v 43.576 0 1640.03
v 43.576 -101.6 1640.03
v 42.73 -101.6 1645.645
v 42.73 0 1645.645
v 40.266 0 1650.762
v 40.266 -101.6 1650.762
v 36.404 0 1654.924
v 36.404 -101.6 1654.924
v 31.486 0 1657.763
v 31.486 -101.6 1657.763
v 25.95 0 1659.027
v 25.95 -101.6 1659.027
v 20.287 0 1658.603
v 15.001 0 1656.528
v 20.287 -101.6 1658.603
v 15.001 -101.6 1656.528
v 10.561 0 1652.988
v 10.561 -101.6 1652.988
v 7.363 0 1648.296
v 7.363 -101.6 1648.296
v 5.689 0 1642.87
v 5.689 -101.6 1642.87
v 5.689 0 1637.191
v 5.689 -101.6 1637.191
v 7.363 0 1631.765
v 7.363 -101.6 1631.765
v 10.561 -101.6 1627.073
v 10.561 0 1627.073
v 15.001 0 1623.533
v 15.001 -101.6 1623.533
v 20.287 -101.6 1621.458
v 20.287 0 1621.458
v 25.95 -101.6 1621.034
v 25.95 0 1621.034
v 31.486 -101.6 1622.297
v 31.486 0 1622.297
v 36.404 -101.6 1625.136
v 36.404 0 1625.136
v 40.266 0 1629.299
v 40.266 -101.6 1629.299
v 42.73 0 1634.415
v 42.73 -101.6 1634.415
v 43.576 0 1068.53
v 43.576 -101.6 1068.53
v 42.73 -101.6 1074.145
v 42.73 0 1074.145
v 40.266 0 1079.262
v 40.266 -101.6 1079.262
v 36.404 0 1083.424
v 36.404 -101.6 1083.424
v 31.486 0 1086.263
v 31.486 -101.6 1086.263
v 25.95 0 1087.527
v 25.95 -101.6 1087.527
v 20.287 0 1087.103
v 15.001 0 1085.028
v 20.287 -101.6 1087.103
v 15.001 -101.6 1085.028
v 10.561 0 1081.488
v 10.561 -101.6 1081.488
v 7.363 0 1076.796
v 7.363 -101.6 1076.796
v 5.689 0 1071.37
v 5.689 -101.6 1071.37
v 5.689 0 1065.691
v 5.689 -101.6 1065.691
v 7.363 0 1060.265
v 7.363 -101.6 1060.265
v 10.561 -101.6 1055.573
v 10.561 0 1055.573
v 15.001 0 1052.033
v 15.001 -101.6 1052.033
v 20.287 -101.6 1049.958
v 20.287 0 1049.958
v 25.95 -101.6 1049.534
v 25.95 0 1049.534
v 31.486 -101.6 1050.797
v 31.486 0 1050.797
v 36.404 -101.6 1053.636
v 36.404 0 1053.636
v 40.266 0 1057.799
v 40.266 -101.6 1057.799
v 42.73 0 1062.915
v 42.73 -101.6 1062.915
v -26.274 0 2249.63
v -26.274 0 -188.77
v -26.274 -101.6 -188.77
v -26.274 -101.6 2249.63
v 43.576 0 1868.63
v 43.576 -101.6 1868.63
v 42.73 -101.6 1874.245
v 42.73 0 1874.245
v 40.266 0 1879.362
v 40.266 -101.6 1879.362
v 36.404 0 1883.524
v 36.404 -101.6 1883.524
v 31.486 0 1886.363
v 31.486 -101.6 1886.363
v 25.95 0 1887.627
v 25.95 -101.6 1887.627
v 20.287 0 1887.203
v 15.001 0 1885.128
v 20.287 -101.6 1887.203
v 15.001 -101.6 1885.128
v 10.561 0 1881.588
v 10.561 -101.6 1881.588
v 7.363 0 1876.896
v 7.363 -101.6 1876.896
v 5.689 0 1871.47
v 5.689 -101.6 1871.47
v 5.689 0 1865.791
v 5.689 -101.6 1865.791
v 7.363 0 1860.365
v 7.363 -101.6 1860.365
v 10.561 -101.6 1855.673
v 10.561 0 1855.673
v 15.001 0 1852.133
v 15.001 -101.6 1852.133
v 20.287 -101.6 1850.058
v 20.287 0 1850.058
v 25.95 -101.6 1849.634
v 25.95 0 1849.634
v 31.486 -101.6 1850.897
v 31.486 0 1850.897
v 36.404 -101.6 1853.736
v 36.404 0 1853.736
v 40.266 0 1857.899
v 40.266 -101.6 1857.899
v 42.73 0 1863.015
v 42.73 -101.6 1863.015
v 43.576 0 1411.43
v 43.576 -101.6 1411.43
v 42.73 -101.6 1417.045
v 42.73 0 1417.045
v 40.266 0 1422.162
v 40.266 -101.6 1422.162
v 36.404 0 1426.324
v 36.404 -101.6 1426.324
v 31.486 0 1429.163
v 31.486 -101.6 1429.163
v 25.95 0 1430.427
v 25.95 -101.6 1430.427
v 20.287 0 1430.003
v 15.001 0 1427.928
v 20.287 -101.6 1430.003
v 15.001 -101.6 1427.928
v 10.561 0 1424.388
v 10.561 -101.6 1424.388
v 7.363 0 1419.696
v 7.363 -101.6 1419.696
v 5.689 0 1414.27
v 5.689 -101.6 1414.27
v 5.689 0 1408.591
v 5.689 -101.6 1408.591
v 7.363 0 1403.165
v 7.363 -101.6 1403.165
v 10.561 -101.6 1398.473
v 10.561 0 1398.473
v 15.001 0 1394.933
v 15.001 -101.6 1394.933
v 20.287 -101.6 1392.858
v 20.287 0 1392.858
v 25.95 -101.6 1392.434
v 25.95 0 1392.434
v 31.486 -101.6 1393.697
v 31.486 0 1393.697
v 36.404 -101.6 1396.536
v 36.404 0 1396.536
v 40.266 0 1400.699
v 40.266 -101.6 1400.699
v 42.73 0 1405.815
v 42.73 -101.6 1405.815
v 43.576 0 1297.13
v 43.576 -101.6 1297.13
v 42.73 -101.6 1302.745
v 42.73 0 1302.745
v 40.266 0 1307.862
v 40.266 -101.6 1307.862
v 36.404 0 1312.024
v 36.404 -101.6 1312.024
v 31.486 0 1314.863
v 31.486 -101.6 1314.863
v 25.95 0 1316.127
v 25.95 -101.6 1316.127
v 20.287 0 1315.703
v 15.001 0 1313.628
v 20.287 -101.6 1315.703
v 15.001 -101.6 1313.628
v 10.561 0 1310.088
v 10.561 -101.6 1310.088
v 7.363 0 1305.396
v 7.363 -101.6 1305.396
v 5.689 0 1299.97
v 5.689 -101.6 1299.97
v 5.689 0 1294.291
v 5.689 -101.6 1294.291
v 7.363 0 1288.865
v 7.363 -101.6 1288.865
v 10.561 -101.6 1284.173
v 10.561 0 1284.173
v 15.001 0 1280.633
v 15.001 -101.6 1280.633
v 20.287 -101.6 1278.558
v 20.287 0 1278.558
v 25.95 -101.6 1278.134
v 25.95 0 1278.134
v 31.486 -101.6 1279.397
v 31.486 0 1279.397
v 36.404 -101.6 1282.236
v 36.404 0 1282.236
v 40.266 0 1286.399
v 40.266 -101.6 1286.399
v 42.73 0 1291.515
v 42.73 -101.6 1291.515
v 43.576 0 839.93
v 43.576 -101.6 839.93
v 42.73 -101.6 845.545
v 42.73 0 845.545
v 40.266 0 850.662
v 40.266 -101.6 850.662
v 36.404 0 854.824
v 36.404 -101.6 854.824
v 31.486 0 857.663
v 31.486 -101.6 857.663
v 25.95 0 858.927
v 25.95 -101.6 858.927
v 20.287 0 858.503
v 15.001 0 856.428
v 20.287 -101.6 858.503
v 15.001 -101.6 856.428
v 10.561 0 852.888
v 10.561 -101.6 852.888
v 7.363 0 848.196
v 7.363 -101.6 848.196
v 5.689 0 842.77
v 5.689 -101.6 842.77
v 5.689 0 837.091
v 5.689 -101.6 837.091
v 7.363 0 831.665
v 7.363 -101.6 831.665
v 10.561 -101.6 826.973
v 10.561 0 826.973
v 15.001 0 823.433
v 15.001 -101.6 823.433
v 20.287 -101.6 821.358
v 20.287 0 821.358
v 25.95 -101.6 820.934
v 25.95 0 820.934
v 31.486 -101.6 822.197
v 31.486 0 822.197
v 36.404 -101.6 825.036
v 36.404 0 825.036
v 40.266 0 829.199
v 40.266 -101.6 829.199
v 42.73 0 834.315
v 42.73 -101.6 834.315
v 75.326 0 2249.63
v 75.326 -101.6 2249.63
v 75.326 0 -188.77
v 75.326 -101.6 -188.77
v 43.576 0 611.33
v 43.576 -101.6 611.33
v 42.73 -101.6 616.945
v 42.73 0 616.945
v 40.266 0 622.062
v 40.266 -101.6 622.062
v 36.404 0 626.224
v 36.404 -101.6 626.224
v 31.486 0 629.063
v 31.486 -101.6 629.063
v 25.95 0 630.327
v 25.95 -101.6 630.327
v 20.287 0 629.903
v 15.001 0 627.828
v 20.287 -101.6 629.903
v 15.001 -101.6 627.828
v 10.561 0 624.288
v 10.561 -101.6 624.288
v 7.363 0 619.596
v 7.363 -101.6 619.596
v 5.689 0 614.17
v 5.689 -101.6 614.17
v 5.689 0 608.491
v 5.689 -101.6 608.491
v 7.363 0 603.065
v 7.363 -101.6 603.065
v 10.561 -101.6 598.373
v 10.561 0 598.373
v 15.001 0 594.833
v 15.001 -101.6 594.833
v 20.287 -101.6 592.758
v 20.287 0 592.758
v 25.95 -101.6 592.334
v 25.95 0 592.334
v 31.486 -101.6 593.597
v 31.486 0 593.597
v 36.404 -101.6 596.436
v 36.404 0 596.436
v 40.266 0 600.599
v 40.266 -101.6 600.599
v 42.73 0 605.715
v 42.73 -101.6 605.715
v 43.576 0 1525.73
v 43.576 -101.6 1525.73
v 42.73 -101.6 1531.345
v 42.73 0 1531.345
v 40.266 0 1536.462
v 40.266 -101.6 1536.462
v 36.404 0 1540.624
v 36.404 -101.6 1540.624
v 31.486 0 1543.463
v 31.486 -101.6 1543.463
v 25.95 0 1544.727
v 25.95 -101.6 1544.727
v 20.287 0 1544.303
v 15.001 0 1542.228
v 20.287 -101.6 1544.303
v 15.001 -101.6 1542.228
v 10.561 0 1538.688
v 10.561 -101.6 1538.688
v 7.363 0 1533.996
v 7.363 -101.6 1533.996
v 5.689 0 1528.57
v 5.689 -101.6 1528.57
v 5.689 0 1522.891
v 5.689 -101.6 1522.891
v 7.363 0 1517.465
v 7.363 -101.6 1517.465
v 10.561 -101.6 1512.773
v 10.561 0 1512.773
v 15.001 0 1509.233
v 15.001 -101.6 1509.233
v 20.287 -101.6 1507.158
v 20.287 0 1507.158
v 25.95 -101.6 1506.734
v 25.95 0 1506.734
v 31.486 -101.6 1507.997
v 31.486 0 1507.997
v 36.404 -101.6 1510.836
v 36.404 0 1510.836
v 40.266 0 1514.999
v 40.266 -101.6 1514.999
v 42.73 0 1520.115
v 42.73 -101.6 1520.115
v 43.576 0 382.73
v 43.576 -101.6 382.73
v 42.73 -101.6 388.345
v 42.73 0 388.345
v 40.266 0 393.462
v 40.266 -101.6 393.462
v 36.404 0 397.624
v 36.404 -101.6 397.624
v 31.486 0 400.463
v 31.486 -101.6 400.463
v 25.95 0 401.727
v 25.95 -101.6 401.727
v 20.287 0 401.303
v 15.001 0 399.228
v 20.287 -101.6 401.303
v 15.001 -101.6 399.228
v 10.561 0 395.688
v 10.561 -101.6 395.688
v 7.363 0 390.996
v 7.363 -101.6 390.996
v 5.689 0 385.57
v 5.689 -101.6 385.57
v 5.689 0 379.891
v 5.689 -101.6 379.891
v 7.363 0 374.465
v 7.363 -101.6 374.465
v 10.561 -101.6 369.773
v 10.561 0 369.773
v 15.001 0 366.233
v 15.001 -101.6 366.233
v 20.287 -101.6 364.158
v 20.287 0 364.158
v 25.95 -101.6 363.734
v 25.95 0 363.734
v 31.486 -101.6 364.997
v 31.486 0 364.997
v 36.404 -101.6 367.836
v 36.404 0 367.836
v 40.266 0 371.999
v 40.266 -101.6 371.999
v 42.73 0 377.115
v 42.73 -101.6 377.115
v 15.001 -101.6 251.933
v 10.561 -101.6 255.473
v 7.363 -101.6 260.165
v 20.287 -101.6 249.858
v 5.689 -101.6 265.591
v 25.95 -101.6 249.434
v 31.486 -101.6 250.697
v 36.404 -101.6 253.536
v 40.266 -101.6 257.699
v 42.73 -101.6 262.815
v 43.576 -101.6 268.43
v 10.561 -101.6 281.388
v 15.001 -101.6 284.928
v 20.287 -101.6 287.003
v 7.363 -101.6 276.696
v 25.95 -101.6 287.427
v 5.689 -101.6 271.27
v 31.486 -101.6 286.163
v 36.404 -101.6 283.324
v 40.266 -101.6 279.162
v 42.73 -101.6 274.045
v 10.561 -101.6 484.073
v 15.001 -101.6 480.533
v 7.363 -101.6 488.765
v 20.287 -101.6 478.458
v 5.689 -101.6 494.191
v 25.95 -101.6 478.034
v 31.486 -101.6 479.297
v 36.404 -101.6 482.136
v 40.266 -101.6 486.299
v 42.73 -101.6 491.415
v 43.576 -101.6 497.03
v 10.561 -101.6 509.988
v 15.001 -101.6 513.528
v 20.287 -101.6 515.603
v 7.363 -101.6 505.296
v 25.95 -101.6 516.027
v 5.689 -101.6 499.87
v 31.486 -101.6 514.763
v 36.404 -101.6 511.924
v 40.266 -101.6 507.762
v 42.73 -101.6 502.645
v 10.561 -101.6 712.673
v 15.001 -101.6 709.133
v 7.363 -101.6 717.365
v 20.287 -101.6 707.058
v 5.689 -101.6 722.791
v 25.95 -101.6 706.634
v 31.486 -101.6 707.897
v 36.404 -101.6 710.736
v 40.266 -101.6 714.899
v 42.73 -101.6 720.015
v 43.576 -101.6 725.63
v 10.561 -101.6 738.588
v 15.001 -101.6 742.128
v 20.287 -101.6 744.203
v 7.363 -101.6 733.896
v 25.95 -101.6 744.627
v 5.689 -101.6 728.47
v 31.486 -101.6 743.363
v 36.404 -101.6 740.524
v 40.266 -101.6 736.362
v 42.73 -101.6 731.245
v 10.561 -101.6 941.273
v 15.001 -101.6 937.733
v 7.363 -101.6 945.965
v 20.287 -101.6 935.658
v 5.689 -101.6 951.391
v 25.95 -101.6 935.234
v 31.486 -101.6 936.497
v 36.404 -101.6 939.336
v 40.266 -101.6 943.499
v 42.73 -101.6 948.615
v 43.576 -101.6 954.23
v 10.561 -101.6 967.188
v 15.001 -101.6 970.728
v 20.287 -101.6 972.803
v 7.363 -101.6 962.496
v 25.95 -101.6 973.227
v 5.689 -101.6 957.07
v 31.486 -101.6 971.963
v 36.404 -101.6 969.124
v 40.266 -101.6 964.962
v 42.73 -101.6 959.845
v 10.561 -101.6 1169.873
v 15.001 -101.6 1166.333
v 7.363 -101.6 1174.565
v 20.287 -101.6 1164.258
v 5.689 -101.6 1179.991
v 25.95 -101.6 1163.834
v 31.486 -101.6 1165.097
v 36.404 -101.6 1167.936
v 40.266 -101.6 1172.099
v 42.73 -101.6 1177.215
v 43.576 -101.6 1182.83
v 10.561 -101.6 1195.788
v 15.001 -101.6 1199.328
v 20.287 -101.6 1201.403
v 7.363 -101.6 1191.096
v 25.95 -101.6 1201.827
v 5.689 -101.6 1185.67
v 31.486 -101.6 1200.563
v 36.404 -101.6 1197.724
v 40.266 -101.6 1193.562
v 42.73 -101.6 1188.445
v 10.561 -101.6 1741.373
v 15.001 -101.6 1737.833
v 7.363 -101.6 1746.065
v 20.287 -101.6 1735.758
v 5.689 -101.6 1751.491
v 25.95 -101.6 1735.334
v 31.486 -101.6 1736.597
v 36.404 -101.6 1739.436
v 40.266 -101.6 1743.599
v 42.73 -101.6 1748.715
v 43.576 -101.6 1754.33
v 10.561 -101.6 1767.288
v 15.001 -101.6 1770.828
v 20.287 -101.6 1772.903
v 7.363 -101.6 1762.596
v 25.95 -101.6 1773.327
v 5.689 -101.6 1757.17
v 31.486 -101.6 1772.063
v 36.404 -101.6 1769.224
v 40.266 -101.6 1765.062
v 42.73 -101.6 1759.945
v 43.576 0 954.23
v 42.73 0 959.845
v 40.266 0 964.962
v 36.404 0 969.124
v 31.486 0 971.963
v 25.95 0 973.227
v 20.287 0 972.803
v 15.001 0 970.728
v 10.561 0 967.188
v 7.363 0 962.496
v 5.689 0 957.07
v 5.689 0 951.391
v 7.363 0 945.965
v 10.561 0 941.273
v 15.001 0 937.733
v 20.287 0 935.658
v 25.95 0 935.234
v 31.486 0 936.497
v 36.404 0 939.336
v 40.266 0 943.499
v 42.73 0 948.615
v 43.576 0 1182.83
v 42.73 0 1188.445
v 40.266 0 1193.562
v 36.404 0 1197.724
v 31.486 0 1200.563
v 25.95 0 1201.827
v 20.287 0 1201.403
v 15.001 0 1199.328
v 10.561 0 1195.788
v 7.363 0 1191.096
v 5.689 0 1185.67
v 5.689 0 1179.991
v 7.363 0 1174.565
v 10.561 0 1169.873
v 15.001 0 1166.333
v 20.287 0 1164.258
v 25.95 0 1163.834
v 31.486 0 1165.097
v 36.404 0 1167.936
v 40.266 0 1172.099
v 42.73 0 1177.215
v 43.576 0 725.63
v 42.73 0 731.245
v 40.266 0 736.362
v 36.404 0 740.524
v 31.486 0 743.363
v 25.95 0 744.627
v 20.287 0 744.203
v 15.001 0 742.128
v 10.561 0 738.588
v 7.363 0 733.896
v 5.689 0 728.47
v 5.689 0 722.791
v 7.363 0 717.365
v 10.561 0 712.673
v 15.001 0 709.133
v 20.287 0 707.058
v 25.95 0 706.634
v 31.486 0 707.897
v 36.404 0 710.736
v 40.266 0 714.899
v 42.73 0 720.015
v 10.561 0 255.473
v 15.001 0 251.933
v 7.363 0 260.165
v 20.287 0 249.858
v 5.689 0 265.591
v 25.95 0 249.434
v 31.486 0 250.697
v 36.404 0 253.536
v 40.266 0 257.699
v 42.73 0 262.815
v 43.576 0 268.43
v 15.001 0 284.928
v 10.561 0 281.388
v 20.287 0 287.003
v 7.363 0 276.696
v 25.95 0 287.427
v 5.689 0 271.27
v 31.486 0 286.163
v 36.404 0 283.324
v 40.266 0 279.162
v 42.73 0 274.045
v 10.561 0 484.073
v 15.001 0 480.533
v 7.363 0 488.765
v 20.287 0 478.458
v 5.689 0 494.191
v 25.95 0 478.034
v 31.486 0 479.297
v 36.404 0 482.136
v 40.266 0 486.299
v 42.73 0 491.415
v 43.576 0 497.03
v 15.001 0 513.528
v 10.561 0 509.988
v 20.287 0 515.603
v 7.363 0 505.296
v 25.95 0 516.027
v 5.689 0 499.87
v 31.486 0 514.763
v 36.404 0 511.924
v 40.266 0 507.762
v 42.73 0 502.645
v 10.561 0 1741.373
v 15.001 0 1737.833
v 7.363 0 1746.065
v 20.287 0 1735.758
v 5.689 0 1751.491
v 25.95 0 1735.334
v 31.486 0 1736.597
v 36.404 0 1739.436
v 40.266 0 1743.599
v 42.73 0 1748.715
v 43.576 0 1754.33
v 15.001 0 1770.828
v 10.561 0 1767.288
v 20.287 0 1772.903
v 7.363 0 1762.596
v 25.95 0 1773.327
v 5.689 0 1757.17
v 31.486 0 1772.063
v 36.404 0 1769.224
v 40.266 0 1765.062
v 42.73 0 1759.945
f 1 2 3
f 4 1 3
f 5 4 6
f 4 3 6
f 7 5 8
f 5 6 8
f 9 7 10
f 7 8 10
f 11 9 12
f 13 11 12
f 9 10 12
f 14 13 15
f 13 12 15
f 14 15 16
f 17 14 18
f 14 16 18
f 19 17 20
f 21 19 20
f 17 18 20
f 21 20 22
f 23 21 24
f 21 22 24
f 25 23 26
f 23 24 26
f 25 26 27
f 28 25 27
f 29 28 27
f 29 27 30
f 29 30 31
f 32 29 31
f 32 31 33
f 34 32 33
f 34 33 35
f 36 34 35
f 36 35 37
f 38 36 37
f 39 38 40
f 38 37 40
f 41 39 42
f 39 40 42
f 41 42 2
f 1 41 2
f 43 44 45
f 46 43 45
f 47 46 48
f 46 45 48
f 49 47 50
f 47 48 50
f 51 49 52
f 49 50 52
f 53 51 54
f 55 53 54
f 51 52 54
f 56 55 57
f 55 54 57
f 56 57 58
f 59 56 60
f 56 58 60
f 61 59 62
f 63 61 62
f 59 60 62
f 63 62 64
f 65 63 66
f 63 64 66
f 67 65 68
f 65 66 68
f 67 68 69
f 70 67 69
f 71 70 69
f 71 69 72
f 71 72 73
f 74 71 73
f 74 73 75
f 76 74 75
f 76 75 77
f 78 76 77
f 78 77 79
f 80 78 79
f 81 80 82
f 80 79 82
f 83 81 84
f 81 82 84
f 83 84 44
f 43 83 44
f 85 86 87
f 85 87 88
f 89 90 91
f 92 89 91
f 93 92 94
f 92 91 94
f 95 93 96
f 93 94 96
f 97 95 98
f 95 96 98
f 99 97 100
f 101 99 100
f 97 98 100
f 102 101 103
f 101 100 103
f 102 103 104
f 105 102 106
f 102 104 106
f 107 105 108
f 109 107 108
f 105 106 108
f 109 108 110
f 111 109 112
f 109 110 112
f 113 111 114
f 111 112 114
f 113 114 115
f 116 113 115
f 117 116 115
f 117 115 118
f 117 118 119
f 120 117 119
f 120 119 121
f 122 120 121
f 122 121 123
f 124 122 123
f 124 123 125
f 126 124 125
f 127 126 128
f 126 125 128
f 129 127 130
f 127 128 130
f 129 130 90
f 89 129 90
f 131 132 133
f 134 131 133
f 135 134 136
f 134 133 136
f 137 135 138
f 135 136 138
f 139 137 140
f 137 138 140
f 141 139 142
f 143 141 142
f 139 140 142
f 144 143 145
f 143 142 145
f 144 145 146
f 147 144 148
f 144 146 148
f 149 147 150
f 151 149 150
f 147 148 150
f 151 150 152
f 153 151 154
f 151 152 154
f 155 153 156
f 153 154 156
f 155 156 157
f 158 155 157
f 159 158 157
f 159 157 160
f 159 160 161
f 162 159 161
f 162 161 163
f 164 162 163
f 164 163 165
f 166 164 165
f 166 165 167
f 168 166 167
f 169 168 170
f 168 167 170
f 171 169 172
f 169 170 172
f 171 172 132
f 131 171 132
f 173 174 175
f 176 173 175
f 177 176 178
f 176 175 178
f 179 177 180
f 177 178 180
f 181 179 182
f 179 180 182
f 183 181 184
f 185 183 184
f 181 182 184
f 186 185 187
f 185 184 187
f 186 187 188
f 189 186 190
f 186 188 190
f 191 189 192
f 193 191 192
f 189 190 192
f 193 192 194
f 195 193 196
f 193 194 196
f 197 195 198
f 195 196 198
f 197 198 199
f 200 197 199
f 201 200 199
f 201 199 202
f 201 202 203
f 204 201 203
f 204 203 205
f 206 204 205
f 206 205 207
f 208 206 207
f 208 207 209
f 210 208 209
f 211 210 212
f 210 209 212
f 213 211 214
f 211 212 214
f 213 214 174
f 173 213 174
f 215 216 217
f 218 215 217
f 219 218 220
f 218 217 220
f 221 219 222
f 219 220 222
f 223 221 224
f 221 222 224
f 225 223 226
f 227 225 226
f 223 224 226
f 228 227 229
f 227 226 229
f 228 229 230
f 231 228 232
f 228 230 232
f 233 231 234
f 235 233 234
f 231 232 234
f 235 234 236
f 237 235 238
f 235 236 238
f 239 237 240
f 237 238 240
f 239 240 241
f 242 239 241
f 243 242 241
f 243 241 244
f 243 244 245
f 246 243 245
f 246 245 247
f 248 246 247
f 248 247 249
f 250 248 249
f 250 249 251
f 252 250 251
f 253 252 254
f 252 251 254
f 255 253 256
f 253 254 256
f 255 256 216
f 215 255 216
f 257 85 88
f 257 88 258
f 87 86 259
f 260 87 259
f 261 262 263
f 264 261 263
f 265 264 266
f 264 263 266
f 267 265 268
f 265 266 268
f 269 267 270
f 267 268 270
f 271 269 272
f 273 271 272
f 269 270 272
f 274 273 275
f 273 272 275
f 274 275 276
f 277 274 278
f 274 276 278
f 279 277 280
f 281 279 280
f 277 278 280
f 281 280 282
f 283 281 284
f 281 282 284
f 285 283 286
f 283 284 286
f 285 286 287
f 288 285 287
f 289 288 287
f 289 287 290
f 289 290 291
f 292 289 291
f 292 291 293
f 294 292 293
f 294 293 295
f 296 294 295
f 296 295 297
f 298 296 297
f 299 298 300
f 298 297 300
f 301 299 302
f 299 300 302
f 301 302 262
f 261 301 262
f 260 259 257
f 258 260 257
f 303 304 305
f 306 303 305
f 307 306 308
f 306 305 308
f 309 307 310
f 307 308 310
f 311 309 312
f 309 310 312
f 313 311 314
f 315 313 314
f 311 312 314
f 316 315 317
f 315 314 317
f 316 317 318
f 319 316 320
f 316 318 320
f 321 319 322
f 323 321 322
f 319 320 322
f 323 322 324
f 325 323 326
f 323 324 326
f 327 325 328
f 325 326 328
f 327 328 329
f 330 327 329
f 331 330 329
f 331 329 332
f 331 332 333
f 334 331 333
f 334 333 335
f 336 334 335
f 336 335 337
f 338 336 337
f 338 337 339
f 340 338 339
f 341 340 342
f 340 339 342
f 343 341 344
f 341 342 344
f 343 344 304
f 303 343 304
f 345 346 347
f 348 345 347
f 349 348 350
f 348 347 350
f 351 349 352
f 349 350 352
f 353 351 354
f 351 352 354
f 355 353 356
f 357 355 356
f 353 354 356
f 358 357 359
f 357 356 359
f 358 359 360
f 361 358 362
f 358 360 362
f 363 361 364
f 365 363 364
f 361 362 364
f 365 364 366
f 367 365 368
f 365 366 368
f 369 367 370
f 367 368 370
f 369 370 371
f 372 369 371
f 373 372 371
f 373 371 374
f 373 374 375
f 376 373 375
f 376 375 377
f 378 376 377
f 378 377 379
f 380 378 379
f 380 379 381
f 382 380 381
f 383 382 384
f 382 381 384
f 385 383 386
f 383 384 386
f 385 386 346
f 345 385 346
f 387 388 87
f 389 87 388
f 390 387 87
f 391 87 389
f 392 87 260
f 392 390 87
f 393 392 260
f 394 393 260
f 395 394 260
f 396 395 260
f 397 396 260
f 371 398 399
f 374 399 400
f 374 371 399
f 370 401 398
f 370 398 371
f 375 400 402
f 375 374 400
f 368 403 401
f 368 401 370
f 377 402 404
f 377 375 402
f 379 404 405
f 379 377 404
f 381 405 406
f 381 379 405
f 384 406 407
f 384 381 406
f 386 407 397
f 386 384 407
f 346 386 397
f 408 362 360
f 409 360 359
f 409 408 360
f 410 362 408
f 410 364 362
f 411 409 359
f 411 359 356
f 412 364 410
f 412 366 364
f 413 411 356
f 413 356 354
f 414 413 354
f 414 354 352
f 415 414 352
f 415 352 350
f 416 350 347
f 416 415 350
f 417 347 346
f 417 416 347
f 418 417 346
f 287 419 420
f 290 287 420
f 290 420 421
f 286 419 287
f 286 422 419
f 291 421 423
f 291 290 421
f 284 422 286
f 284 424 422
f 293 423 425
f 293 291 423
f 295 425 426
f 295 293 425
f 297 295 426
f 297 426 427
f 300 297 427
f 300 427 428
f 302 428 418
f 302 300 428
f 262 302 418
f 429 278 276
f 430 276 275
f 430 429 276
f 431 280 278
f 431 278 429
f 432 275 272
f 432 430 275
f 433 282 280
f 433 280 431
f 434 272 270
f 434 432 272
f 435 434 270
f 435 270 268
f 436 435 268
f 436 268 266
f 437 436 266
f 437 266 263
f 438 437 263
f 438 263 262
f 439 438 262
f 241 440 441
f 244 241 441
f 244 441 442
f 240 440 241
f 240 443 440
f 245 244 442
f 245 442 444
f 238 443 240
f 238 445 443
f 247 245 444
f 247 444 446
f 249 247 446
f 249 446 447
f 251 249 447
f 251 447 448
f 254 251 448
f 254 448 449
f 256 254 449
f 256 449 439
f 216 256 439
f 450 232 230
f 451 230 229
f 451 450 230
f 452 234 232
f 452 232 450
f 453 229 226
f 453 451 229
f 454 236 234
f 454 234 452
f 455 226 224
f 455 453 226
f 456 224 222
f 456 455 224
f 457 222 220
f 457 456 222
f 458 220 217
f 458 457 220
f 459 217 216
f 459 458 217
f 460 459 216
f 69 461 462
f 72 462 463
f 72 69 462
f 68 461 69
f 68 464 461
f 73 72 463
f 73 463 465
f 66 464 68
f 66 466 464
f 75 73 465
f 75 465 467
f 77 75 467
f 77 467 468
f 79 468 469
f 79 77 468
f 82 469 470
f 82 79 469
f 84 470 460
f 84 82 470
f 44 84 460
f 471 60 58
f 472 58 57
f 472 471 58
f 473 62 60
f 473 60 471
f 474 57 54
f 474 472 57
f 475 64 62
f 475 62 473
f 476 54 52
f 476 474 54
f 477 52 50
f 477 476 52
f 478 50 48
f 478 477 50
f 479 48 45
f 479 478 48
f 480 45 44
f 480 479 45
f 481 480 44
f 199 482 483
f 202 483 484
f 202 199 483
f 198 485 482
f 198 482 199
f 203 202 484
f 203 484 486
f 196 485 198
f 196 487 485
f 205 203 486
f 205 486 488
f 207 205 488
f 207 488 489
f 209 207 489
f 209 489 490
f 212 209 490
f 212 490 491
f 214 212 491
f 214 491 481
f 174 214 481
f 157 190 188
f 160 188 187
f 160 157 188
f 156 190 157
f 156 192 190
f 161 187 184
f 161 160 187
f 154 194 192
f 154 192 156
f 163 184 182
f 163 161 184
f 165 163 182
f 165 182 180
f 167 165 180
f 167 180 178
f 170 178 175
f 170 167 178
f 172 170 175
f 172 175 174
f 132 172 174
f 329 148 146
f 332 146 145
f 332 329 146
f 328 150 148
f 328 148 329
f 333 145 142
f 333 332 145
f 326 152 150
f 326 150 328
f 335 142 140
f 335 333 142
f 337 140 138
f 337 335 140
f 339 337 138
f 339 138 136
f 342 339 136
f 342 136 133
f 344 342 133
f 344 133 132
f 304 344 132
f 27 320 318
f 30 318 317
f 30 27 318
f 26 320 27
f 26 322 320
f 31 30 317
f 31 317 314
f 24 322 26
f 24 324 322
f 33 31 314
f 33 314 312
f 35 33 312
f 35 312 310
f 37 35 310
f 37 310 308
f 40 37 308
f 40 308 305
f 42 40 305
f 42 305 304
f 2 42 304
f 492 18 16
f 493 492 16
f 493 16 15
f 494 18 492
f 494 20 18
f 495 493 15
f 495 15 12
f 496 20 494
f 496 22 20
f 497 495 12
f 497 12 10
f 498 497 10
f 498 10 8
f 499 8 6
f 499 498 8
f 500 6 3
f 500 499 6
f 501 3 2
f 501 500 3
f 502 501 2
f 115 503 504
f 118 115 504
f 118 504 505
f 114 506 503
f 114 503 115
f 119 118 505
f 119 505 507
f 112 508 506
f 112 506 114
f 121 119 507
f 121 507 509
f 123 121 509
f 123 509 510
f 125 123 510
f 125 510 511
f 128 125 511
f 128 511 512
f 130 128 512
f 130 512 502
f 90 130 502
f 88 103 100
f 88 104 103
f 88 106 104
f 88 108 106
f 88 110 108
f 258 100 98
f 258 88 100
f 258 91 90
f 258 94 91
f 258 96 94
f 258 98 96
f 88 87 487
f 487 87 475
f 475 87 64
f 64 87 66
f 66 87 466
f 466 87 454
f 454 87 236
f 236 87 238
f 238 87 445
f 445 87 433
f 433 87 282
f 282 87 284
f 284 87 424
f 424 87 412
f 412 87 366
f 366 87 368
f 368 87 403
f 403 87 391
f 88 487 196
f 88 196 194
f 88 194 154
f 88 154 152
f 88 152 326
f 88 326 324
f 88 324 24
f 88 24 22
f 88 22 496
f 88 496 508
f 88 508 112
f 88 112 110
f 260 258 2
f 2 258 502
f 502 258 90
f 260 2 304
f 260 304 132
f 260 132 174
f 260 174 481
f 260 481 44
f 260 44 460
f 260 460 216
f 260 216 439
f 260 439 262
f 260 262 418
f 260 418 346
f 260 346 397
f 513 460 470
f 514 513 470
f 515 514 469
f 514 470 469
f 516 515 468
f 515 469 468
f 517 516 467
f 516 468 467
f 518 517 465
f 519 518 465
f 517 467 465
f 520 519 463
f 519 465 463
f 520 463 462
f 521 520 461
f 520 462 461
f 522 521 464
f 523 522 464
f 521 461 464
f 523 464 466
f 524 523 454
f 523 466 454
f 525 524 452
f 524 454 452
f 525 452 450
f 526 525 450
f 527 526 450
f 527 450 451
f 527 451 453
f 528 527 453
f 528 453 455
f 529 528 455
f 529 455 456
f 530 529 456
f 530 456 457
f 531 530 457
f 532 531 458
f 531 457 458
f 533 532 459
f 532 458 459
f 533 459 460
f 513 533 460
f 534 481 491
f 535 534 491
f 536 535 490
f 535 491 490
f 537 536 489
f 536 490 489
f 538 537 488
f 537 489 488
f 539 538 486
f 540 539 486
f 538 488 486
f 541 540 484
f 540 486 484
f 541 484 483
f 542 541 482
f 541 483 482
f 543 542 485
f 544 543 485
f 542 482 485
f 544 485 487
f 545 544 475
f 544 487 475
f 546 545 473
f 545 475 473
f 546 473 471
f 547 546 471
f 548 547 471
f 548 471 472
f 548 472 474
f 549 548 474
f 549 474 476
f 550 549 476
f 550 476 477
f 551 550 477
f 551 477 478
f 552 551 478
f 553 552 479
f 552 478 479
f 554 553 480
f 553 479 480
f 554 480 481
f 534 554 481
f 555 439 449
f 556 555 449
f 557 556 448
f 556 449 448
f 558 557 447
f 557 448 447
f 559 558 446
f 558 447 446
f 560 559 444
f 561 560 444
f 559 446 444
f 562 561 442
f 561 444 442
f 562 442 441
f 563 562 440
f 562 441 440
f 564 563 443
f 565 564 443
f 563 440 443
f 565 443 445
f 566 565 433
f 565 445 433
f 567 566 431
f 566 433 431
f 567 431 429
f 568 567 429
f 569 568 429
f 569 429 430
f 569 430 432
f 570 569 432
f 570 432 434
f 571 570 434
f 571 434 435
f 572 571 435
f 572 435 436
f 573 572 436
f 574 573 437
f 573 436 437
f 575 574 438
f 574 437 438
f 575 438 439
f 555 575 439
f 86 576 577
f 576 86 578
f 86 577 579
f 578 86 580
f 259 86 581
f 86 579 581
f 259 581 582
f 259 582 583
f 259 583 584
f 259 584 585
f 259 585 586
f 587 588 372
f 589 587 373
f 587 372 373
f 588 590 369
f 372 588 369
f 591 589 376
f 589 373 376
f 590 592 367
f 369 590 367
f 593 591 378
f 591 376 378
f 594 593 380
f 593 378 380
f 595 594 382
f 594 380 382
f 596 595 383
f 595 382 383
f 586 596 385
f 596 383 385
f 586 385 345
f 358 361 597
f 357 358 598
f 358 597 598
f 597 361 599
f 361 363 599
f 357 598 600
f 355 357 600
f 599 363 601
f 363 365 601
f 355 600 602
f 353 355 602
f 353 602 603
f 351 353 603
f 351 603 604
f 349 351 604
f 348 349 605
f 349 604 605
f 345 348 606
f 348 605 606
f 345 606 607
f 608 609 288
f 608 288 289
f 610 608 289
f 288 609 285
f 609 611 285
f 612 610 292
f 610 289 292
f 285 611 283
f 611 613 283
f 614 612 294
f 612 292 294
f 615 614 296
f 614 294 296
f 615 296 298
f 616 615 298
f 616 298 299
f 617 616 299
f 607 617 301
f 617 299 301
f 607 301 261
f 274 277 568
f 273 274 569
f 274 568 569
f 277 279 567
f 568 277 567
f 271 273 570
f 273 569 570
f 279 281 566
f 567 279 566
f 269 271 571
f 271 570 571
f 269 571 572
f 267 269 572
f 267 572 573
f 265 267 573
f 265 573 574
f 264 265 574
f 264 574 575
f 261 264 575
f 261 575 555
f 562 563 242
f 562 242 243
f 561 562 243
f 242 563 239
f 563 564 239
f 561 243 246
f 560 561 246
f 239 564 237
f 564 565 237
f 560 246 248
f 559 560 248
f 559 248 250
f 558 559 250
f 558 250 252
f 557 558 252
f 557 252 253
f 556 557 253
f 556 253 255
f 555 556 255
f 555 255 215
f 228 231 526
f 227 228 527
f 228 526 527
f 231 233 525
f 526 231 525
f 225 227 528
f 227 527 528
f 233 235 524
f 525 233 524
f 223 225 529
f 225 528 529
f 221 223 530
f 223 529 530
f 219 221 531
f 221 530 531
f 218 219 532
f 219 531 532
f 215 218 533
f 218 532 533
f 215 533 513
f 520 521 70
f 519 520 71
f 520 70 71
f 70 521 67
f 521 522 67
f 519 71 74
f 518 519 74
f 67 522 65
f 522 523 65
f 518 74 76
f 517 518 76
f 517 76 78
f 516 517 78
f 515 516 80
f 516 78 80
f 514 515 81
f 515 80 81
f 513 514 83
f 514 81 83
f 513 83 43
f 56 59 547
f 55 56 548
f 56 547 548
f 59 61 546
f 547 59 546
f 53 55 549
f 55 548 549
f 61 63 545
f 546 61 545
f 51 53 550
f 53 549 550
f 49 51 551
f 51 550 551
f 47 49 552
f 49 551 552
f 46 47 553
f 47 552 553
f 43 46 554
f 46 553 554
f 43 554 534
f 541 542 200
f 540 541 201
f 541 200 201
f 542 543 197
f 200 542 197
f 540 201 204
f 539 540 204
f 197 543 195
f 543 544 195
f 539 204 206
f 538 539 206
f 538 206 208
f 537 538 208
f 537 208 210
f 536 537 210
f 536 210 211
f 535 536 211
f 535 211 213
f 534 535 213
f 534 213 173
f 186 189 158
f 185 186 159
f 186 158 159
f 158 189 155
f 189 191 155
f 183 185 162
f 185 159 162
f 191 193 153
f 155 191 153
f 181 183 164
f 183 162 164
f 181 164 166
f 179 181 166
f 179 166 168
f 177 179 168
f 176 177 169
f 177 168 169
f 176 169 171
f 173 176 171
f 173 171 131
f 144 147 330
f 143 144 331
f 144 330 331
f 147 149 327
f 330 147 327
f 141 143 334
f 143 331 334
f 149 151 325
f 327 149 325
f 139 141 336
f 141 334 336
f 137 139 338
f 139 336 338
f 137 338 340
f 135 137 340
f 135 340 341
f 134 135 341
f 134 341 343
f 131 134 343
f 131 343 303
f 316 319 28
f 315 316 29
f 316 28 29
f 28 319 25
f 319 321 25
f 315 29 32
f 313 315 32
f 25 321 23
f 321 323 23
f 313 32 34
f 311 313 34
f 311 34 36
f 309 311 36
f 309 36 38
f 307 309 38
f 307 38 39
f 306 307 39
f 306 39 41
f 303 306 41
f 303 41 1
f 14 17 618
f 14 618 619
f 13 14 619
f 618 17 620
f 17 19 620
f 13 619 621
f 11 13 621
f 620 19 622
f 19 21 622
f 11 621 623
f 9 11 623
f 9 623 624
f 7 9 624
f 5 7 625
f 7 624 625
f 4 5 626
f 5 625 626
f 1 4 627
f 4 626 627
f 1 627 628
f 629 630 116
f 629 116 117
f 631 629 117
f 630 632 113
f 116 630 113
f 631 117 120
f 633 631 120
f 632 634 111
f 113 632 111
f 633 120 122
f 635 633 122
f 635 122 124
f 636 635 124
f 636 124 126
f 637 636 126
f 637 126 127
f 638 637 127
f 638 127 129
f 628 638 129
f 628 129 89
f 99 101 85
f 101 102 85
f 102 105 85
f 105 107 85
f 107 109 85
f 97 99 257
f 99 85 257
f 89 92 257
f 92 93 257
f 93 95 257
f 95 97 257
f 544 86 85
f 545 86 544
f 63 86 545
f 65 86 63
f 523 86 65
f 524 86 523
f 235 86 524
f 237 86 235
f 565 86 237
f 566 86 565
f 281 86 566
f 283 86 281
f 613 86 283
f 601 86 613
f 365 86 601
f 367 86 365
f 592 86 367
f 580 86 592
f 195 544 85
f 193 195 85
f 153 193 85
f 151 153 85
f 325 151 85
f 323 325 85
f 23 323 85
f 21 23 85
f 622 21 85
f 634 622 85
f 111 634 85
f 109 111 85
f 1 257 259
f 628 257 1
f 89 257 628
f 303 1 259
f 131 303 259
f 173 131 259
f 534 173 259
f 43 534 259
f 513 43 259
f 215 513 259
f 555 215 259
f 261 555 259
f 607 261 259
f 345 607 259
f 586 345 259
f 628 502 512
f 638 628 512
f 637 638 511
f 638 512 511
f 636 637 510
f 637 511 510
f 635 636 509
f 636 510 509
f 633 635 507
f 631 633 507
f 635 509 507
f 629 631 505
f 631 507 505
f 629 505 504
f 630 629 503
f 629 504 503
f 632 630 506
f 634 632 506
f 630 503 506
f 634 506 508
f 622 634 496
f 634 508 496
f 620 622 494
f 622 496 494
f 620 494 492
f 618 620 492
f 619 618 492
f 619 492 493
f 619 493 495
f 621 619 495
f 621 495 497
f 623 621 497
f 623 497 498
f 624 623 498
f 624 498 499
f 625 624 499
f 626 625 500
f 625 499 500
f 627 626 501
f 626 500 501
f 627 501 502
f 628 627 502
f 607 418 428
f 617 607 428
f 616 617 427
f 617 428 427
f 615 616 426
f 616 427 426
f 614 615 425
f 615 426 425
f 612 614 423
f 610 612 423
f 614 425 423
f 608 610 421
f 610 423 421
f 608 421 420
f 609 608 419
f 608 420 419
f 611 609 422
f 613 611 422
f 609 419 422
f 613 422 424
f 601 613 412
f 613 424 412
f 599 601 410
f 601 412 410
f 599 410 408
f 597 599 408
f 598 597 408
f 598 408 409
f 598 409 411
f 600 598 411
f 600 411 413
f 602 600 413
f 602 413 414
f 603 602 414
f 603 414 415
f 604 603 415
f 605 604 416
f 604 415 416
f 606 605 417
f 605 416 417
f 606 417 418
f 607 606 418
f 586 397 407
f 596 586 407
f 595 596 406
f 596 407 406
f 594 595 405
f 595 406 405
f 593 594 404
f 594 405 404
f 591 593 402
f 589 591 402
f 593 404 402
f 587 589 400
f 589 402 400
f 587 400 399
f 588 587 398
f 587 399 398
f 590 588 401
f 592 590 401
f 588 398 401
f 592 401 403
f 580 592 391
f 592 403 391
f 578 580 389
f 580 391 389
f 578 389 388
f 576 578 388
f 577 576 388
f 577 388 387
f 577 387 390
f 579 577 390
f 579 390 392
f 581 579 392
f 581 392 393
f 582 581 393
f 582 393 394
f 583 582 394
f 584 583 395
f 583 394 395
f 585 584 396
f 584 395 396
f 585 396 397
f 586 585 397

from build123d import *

# Parameters (mm, degrees)
F0_W     = 101.6
F0_H     = 2438.4
F1_DEPTH = 101.6
F3_DEPTH = 101.6


with BuildPart() as f1:
    # F0 (on Front) → F1 (new body)
    with BuildSketch(Plane.XZ):
        with Locations((24.5261041723, 1030.4303231494)):
            Rectangle(F0_W, F0_H)
    extrude(amount=F1_DEPTH)

    # F2 (on face) → F3 (cut)
    with BuildSketch(Plane.XZ.offset(101.6)):
        with BuildLine():
            Line((24.5261041723, 1849.5803231494), (24.5261041723, 1887.6803231494))
            ThreePointArc((24.5261041723, 1887.6803231494), (5.4761041723, 1868.6303231494), (24.5261041723, 1849.5803231494))
        make_face()
        with BuildLine():
            ThreePointArc((43.5761041723, 1868.6303231494), (37.9964883539, 1882.100707331), (24.5261041723, 1887.6803231494))
            Line((24.5261041723, 1887.6803231494), (24.5261041723, 1849.5803231494))
            ThreePointArc((24.5261041723, 1849.5803231494), (37.9964883539, 1855.1599389678), (43.5761041723, 1868.6303231494))
        make_face()
        with BuildLine():
            Line((24.5261041723, 1735.2803231494), (24.5261041723, 1773.3803231494))
            ThreePointArc((24.5261041723, 1773.3803231494), (5.4761041723, 1754.3303231494), (24.5261041723, 1735.2803231494))
        make_face()
        with BuildLine():
            ThreePointArc((43.5761041723, 1754.3303231494), (37.9964883539, 1767.800707331), (24.5261041723, 1773.3803231494))
            Line((24.5261041723, 1773.3803231494), (24.5261041723, 1735.2803231494))
            ThreePointArc((24.5261041723, 1735.2803231494), (37.9964883539, 1740.8599389678), (43.5761041723, 1754.3303231494))
        make_face()
        with BuildLine():
            Line((24.5261041723, 1620.9803231494), (24.5261041723, 1659.0803231494))
            ThreePointArc((24.5261041723, 1659.0803231494), (5.4761041723, 1640.0303231494), (24.5261041723, 1620.9803231494))
        make_face()
        with BuildLine():
            ThreePointArc((43.5761041723, 1640.0303231494), (37.9964883539, 1653.500707331), (24.5261041723, 1659.0803231494))
            Line((24.5261041723, 1659.0803231494), (24.5261041723, 1620.9803231494))
            ThreePointArc((24.5261041723, 1620.9803231494), (37.9964883539, 1626.5599389678), (43.5761041723, 1640.0303231494))
        make_face()
        with BuildLine():
            ThreePointArc((24.5261041723, 1544.7803231494), (5.4761041723, 1525.7303231494), (24.5261041723, 1506.6803231494))
            Line((24.5261041723, 1506.6803231494), (24.5261041723, 1544.7803231494))
        make_face()
        with BuildLine():
            Line((24.5261041723, 1430.4803231494), (24.5261041723, 1392.3803231494))
            ThreePointArc((24.5261041723, 1392.3803231494), (37.9964883539, 1397.9599389678), (43.5761041723, 1411.4303231494))
            ThreePointArc((43.5761041723, 1411.4303231494), (37.9964883539, 1424.900707331), (24.5261041723, 1430.4803231494))
        make_face()
        with BuildLine():
            ThreePointArc((24.5261041723, 1430.4803231494), (5.4761041723, 1411.4303231494), (24.5261041723, 1392.3803231494))
            Line((24.5261041723, 1392.3803231494), (24.5261041723, 1430.4803231494))
        make_face()
        with BuildLine():
            Line((24.5261041723, 1544.7803231494), (24.5261041723, 1506.6803231494))
            ThreePointArc((24.5261041723, 1506.6803231494), (37.9964883539, 1512.2599389678), (43.5761041723, 1525.7303231494))
            ThreePointArc((43.5761041723, 1525.7303231494), (37.9964883539, 1539.200707331), (24.5261041723, 1544.7803231494))
        make_face()
        with BuildLine():
            Line((24.5261041723, 1316.1803231494), (24.5261041723, 1278.0803231494))
            ThreePointArc((24.5261041723, 1278.0803231494), (37.9964883539, 1283.6599389678), (43.5761041723, 1297.1303231494))
            ThreePointArc((43.5761041723, 1297.1303231494), (37.9964883539, 1310.600707331), (24.5261041723, 1316.1803231494))
        make_face()
        with BuildLine():
            ThreePointArc((24.5261041723, 1316.1803231494), (5.4761041723, 1297.1303231494), (24.5261041723, 1278.0803231494))
            Line((24.5261041723, 1278.0803231494), (24.5261041723, 1316.1803231494))
        make_face()
        with BuildLine():
            ThreePointArc((24.5261041723, 1201.8803231494), (5.4761041723, 1182.8303231494), (24.5261041723, 1163.7803231494))
            Line((24.5261041723, 1163.7803231494), (24.5261041723, 1201.8803231494))
        make_face()
        with BuildLine():
            Line((24.5261041723, 1201.8803231494), (24.5261041723, 1163.7803231494))
            ThreePointArc((24.5261041723, 1163.7803231494), (37.9964883539, 1169.3599389678), (43.5761041723, 1182.8303231494))
            ThreePointArc((43.5761041723, 1182.8303231494), (37.9964883539, 1196.300707331), (24.5261041723, 1201.8803231494))
        make_face()
        with BuildLine():
            ThreePointArc((43.5761041723, 1068.5303231494), (37.9964883539, 1082.000707331), (24.5261041723, 1087.5803231494))
            Line((24.5261041723, 1087.5803231494), (24.5261041723, 1049.4803231494))
            ThreePointArc((24.5261041723, 1049.4803231494), (37.9964883539, 1055.0599389678), (43.5761041723, 1068.5303231494))
        make_face()
        with BuildLine():
            Line((24.5261041723, 1049.4803231494), (24.5261041723, 1087.5803231494))
            ThreePointArc((24.5261041723, 1087.5803231494), (5.4761041723, 1068.5303231494), (24.5261041723, 1049.4803231494))
        make_face()
        with BuildLine():
            Line((24.5261041723, 935.1803231494), (24.5261041723, 973.2803231494))
            ThreePointArc((24.5261041723, 973.2803231494), (5.4761041723, 954.2303231494), (24.5261041723, 935.1803231494))
        make_face()
        with BuildLine():
            ThreePointArc((43.5761041723, 954.2303231494), (37.9964883539, 967.700707331), (24.5261041723, 973.2803231494))
            Line((24.5261041723, 973.2803231494), (24.5261041723, 935.1803231494))
            ThreePointArc((24.5261041723, 935.1803231494), (37.9964883539, 940.7599389678), (43.5761041723, 954.2303231494))
        make_face()
        with BuildLine():
            ThreePointArc((24.5261041723, 858.9803231494), (5.4761041723, 839.9303231494), (24.5261041723, 820.8803231494))
            Line((24.5261041723, 820.8803231494), (24.5261041723, 858.9803231494))
        make_face()
        with BuildLine():
            Line((24.5261041723, 858.9803231494), (24.5261041723, 820.8803231494))
            ThreePointArc((24.5261041723, 820.8803231494), (37.9964883539, 826.4599389678), (43.5761041723, 839.9303231494))
            ThreePointArc((43.5761041723, 839.9303231494), (37.9964883539, 853.400707331), (24.5261041723, 858.9803231494))
        make_face()
        with BuildLine():
            ThreePointArc((24.5261041723, 744.6803231494), (5.4761041723, 725.6303231494), (24.5261041723, 706.5803231494))
            Line((24.5261041723, 706.5803231494), (24.5261041723, 744.6803231494))
        make_face()
        with BuildLine():
            Line((24.5261041723, 744.6803231494), (24.5261041723, 706.5803231494))
            ThreePointArc((24.5261041723, 706.5803231494), (37.9964883539, 712.1599389678), (43.5761041723, 725.6303231494))
            ThreePointArc((43.5761041723, 725.6303231494), (37.9964883539, 739.100707331), (24.5261041723, 744.6803231494))
        make_face()
        with BuildLine():
            Line((24.5261041723, 592.2803231494), (24.5261041723, 630.3803231494))
            ThreePointArc((24.5261041723, 630.3803231494), (5.4761041723, 611.3303231494), (24.5261041723, 592.2803231494))
        make_face()
        with BuildLine():
            ThreePointArc((43.5761041723, 611.3303231494), (37.9964883539, 624.800707331), (24.5261041723, 630.3803231494))
            Line((24.5261041723, 630.3803231494), (24.5261041723, 592.2803231494))
            ThreePointArc((24.5261041723, 592.2803231494), (37.9964883539, 597.8599389678), (43.5761041723, 611.3303231494))
        make_face()
        with BuildLine():
            ThreePointArc((24.5261041723, 516.0803231494), (5.4761041723, 497.0303231494), (24.5261041723, 477.9803231494))
            Line((24.5261041723, 477.9803231494), (24.5261041723, 516.0803231494))
        make_face()
        with BuildLine():
            Line((24.5261041723, 516.0803231494), (24.5261041723, 477.9803231494))
            ThreePointArc((24.5261041723, 477.9803231494), (37.9964883539, 483.5599389678), (43.5761041723, 497.0303231494))
            ThreePointArc((43.5761041723, 497.0303231494), (37.9964883539, 510.500707331), (24.5261041723, 516.0803231494))
        make_face()
        with BuildLine():
            ThreePointArc((24.5261041723, 401.7803231494), (5.4761041723, 382.7303231494), (24.5261041723, 363.6803231494))
            Line((24.5261041723, 363.6803231494), (24.5261041723, 401.7803231494))
        make_face()
        with BuildLine():
            Line((24.5261041723, 401.7803231494), (24.5261041723, 363.6803231494))
            ThreePointArc((24.5261041723, 363.6803231494), (37.9964883539, 369.2599389678), (43.5761041723, 382.7303231494))
            ThreePointArc((43.5761041723, 382.7303231494), (37.9964883539, 396.200707331), (24.5261041723, 401.7803231494))
        make_face()
        with BuildLine():
            ThreePointArc((24.5261041723, 287.4803231494), (5.4761041723, 268.4303231494), (24.5261041723, 249.3803231494))
            Line((24.5261041723, 249.3803231494), (24.5261041723, 268.4303231494))
            Line((24.5261041723, 268.4303231494), (24.5261041723, 287.4803231494))
        make_face()
        with BuildLine():
            Line((24.5261041723, 268.4303231494), (24.5261041723, 249.3803231494))
            ThreePointArc((24.5261041723, 249.3803231494), (37.9964883539, 254.9599389678), (43.5761041723, 268.4303231494))
            ThreePointArc((43.5761041723, 268.4303231494), (37.9964883539, 281.900707331), (24.5261041723, 287.4803231494))
            Line((24.5261041723, 287.4803231494), (24.5261041723, 268.4303231494))
        make_face()
    extrude(amount=-F3_DEPTH, mode=Mode.SUBTRACT)


solid = f1.part
